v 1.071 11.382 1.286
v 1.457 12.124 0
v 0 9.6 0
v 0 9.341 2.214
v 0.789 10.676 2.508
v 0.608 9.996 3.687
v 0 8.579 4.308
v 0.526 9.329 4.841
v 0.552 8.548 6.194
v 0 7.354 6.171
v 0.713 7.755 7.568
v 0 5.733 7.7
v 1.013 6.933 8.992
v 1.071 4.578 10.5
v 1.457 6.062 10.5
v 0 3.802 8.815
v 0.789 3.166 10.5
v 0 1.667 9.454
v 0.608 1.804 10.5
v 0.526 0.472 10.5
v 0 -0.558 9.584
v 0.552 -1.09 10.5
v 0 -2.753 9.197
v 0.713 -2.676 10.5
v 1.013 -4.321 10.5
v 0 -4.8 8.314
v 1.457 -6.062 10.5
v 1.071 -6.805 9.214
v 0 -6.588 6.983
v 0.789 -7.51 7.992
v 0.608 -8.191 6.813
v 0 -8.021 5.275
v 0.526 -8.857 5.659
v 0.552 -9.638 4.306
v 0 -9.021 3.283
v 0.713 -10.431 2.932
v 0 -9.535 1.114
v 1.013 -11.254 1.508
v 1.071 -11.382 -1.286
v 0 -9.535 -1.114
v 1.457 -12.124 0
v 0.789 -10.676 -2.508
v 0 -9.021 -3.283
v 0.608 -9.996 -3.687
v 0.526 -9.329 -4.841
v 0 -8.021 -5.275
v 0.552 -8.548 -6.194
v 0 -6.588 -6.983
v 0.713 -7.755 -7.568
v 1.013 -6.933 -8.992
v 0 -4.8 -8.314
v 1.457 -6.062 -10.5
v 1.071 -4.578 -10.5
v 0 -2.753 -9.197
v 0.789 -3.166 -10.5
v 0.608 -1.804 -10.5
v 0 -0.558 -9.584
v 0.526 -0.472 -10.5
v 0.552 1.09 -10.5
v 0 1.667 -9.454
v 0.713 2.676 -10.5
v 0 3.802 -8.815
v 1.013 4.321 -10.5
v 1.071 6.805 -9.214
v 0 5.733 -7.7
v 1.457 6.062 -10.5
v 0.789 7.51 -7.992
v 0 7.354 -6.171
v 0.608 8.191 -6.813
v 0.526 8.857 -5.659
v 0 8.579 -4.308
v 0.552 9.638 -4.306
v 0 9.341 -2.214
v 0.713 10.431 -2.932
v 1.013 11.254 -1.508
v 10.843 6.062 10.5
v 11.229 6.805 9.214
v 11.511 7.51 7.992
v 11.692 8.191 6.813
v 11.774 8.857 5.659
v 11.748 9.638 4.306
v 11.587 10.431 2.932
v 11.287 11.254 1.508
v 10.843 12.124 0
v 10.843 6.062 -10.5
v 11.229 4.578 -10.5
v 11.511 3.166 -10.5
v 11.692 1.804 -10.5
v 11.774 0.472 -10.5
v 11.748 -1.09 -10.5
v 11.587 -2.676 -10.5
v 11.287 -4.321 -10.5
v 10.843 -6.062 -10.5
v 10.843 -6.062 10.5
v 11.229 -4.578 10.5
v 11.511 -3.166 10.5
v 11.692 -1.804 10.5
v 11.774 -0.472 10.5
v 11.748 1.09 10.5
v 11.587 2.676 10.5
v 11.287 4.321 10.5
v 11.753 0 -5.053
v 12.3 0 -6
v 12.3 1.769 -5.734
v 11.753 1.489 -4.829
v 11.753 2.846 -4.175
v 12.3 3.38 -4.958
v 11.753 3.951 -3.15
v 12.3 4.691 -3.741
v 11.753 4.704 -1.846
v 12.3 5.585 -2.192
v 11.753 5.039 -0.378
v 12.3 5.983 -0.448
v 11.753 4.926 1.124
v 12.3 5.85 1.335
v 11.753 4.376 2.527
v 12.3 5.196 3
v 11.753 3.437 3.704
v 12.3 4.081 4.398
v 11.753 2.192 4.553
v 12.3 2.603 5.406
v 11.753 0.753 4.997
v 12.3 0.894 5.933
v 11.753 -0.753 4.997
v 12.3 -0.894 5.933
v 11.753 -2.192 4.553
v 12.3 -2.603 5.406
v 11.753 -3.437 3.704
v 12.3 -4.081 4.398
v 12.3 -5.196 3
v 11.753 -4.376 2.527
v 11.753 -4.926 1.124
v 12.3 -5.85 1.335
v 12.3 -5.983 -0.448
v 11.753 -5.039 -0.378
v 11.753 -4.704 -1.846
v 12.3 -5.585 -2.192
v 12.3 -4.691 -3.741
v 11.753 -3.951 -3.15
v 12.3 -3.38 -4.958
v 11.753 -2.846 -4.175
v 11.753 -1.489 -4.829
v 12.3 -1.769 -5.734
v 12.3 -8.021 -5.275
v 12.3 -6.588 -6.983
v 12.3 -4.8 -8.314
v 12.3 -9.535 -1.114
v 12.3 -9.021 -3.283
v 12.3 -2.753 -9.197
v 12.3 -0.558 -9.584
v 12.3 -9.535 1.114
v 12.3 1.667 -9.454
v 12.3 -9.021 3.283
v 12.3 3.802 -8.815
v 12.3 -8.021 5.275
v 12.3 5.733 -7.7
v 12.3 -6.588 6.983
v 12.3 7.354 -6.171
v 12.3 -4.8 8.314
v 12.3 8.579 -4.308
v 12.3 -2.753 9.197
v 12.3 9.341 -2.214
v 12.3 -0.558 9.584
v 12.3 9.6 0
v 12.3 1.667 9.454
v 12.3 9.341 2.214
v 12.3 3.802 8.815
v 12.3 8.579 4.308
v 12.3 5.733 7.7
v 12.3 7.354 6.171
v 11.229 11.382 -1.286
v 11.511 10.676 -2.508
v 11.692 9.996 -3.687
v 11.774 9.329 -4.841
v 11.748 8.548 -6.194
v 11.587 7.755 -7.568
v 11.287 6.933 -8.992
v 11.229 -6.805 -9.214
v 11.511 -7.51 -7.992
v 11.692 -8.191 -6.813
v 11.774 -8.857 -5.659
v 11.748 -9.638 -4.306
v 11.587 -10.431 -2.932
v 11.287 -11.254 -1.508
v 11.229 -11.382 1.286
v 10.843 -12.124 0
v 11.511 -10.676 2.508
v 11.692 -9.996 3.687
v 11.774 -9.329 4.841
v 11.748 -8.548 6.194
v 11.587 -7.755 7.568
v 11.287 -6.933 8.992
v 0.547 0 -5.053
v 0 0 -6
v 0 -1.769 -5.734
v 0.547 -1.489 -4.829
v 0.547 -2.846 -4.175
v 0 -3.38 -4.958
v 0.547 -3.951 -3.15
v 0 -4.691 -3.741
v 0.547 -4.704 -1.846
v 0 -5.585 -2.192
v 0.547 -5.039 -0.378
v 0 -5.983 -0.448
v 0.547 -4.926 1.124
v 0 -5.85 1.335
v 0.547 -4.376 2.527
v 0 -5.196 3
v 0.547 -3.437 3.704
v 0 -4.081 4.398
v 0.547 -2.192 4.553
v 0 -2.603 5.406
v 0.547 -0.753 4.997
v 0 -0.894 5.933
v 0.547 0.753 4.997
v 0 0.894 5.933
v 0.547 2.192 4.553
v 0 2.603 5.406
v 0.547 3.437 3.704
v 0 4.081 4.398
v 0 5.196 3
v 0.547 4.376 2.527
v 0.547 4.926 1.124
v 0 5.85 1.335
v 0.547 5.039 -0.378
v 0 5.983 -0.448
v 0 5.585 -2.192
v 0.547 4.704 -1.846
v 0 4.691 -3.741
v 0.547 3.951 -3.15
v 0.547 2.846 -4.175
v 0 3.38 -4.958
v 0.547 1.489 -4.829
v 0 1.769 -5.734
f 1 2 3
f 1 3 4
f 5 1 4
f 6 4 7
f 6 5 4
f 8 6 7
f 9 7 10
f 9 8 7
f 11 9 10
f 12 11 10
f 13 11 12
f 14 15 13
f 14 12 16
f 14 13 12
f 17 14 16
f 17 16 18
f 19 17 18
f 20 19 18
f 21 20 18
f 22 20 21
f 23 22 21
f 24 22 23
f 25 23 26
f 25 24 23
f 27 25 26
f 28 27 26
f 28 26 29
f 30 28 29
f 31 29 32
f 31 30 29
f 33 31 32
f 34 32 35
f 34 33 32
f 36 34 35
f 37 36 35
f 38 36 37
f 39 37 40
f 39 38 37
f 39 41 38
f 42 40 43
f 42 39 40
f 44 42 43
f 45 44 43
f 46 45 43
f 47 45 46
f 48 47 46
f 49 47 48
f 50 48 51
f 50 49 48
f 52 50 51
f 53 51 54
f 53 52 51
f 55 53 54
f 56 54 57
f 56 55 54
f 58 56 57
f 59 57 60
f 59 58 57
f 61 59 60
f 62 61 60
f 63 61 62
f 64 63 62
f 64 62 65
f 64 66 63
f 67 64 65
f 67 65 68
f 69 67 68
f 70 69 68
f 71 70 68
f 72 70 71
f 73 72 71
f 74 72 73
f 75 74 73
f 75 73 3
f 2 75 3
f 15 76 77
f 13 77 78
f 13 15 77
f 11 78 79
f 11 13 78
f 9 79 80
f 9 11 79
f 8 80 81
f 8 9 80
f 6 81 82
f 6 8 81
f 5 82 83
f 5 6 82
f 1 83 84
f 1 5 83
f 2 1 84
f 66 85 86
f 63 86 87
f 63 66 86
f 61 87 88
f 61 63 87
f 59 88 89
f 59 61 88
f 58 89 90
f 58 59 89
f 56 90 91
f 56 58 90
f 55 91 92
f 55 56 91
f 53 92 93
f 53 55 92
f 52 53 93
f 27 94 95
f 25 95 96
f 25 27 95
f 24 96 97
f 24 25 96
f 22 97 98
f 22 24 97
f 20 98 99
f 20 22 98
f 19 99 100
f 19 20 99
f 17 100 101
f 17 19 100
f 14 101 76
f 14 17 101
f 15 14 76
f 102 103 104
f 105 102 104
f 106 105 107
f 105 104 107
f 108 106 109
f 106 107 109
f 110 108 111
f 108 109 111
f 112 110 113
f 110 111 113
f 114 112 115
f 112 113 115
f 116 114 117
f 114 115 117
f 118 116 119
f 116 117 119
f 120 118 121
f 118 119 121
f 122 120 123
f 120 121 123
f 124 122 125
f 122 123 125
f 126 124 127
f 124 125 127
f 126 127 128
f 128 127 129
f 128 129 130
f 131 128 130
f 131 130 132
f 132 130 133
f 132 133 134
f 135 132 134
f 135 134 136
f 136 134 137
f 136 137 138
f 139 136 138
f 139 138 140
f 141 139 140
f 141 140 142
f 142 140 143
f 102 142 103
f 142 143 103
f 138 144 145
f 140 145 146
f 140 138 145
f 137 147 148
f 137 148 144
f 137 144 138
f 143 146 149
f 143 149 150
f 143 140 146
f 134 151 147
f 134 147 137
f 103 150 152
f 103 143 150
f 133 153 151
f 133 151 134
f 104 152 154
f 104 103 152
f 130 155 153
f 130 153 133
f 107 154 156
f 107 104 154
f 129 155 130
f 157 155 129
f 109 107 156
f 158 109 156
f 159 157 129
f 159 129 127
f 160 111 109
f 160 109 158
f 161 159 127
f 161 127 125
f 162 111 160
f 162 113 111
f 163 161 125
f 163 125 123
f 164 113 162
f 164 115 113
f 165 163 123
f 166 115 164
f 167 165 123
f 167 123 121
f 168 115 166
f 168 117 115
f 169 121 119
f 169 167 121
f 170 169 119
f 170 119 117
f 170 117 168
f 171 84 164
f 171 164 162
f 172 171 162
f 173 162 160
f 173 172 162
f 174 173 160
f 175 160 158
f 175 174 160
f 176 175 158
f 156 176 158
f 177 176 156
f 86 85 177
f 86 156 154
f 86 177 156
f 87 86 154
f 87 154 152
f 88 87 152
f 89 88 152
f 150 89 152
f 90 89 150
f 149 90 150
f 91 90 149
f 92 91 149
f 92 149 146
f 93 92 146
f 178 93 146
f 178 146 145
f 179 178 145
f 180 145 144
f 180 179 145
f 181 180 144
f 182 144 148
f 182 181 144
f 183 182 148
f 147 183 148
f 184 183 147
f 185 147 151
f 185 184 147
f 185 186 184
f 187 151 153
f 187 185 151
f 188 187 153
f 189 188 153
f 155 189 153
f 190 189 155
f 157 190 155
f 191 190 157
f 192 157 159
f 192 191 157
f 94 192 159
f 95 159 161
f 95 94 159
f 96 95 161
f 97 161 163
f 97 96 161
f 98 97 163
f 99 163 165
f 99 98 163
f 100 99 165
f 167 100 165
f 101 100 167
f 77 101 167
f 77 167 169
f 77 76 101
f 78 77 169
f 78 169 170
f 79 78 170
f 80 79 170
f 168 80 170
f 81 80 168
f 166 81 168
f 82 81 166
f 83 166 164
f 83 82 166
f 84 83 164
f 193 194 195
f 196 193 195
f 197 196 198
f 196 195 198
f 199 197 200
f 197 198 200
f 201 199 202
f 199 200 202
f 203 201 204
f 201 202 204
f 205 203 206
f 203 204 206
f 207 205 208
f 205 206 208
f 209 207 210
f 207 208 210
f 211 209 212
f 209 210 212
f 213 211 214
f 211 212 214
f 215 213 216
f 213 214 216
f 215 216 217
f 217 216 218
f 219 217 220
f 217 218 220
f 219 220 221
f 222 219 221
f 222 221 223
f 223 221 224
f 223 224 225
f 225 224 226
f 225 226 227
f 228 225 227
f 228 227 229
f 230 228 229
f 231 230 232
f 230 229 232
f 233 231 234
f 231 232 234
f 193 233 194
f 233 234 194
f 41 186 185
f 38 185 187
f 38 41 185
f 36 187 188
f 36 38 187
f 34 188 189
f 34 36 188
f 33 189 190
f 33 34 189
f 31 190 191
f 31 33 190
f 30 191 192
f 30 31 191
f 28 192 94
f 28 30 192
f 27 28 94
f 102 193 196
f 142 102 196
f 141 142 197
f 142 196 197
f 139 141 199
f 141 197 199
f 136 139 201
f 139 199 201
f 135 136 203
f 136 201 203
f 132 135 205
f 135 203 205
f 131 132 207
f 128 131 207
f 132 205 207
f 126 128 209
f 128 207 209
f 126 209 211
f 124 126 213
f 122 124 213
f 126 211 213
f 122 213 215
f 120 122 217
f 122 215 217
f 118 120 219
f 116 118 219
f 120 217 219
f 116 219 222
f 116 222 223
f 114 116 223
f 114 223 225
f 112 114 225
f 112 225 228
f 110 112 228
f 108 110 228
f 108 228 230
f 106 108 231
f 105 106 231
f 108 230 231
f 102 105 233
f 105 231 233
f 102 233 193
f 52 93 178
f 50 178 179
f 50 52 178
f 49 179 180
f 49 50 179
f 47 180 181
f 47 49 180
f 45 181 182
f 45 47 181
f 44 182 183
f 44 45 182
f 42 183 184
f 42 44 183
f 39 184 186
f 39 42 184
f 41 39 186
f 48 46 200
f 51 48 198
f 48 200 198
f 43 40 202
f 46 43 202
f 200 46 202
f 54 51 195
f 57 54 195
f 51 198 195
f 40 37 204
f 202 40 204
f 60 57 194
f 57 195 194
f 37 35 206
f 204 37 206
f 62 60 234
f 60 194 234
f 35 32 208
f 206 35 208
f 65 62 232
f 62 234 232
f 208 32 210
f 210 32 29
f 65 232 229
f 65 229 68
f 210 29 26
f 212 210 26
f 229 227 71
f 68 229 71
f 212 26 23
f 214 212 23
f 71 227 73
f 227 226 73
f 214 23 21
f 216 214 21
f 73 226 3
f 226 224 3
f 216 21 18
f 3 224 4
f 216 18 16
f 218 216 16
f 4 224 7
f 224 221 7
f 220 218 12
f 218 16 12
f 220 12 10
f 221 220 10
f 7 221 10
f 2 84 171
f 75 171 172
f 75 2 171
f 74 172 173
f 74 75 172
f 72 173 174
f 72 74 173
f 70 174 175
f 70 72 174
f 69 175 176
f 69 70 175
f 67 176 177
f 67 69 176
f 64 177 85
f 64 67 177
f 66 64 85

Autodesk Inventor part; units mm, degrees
ref_plane "YZ Plane" through (0, 0, 0) normal (1, 0, 0) x (0, 1, 0)
ref_plane "XZ Plane" through (0, 0, 0) normal (0, 1, 0) x (-1, 0, 0)
sketch "Sketch1" plane through (0, 0, 0) normal (1, 0, 0) x (0, 1, 0)
  line L0 (-12.1244, 0) -> (-6.0622, 10.5)
  line L1 (-6.0622, 10.5) -> (6.0622, 10.5)
  line L2 (6.0622, 10.5) -> (12.1244, 0)
  line L3 (12.1244, 0) -> (6.0622, -10.5)
  line L4 (6.0622, -10.5) -> (-6.0622, -10.5)
  line L5 (-6.0622, -10.5) -> (-12.1244, 0)
  point P0 (0, 0)
  point P1 (0, 0)
  dimension "d0" = 24.2487
extrude "Body" add sketch "Sketch1" along normal blind 12.3
sketch "Sketch2" plane through (0, 0, 0) normal (0, 0, 1) x (1, 0, 0)
  line L0 (0, 6.0622) -> (0, 12.1244) projected
  line L1 (0, 12.1244) -> (12.3, 12.1244) projected
  line L2 (12.3, 6.0622) -> (12.3, 12.1244) projected
  line L3 (-2.46, 0) -> (14.76, 0) projected
  line L4 (1.4574, 12.1244) -> (0, 9.6)
  line L5 (10.8426, 12.1244) -> (12.3, 9.6)
  dimension "d3" = 30
  dimension "d4" = 30
  dimension "d5" = 19.2
  dimension "d6" = 19.2
revolve "Chamfer1" cut sketch "Sketch2" angle 360 about axis through (-10, 0, 0) along (1, 0, 0)
sketch "Sketch3" plane through (12.3, 0, 0) normal (1, 0, 0) x (0, 0, -1)
  arc A0 (-0.625, -1.0825) -> (0.625, -1.0825) centre (0, 0) ccw projected
hole "Thread" at (12.3, 0, 0) direction (-1, 0, 0) diameter 10.106 end through all thread size "M12x1.75" class "6H" standard "ISO Metric profile"
chamfer "Chamfer2" distance 0.9472 angle 30 1 edges at (12.3, 0, 5.053) measured on face at (12.3, 7.9791, -0.9688)
chamfer "Chamfer3" distance 0.9472 angle 30 1 edges at (0, 0, 5.053) measured on face at (0, 7.9791, -0.9688)
ref_plane "Work Plane1" through (-22.2692, 0, 0) normal (0, -0.866, -0.5) x (1, 0, 0)
equation "\"d0\" = 1.1547 * SW"
equation "\"d1\" = KOH"
equation "\"d8\" = -0.5 * GD1 + 0.5 * NND"
equation "\"d40\" = -0.5 * GD1 + 0.5 * NND"
equation "\"d10\" = -0.5 * GD1 + 0.5 * NND"
equation "\"d41\" = -0.5 * GD1 + 0.5 * NND"
equation "\"d3\" = ANG1"
equation "\"d4\" = ANG2"
equation "\"d5\" = SW0"
equation "\"d6\" = SW01"
equation "\"ANG1\" = 30deg"
equation "\"ANG2\" = 30deg"
equation "\"NND\" = 12"
equation "\"KOH\" = 12.3"
equation "\"SW\" = 21"
equation "\"SW0\" = 19.2"
equation "\"SW01\" = SW0"
equation "\"GUL\" = 0.541266 * PTC"
equation "\"THREADDIA\" = 12"
equation "\"TOA\" = 30deg"
equation "\"PTC\" = 1.75"
equation "\"E0\" = 1.155 * SW"
equation "\"GAL\" = 0.541266 * PTC"
equation "\"GD1\" = 10.105569"
properties part number "ISO 4775 - M12" material "Steel"
